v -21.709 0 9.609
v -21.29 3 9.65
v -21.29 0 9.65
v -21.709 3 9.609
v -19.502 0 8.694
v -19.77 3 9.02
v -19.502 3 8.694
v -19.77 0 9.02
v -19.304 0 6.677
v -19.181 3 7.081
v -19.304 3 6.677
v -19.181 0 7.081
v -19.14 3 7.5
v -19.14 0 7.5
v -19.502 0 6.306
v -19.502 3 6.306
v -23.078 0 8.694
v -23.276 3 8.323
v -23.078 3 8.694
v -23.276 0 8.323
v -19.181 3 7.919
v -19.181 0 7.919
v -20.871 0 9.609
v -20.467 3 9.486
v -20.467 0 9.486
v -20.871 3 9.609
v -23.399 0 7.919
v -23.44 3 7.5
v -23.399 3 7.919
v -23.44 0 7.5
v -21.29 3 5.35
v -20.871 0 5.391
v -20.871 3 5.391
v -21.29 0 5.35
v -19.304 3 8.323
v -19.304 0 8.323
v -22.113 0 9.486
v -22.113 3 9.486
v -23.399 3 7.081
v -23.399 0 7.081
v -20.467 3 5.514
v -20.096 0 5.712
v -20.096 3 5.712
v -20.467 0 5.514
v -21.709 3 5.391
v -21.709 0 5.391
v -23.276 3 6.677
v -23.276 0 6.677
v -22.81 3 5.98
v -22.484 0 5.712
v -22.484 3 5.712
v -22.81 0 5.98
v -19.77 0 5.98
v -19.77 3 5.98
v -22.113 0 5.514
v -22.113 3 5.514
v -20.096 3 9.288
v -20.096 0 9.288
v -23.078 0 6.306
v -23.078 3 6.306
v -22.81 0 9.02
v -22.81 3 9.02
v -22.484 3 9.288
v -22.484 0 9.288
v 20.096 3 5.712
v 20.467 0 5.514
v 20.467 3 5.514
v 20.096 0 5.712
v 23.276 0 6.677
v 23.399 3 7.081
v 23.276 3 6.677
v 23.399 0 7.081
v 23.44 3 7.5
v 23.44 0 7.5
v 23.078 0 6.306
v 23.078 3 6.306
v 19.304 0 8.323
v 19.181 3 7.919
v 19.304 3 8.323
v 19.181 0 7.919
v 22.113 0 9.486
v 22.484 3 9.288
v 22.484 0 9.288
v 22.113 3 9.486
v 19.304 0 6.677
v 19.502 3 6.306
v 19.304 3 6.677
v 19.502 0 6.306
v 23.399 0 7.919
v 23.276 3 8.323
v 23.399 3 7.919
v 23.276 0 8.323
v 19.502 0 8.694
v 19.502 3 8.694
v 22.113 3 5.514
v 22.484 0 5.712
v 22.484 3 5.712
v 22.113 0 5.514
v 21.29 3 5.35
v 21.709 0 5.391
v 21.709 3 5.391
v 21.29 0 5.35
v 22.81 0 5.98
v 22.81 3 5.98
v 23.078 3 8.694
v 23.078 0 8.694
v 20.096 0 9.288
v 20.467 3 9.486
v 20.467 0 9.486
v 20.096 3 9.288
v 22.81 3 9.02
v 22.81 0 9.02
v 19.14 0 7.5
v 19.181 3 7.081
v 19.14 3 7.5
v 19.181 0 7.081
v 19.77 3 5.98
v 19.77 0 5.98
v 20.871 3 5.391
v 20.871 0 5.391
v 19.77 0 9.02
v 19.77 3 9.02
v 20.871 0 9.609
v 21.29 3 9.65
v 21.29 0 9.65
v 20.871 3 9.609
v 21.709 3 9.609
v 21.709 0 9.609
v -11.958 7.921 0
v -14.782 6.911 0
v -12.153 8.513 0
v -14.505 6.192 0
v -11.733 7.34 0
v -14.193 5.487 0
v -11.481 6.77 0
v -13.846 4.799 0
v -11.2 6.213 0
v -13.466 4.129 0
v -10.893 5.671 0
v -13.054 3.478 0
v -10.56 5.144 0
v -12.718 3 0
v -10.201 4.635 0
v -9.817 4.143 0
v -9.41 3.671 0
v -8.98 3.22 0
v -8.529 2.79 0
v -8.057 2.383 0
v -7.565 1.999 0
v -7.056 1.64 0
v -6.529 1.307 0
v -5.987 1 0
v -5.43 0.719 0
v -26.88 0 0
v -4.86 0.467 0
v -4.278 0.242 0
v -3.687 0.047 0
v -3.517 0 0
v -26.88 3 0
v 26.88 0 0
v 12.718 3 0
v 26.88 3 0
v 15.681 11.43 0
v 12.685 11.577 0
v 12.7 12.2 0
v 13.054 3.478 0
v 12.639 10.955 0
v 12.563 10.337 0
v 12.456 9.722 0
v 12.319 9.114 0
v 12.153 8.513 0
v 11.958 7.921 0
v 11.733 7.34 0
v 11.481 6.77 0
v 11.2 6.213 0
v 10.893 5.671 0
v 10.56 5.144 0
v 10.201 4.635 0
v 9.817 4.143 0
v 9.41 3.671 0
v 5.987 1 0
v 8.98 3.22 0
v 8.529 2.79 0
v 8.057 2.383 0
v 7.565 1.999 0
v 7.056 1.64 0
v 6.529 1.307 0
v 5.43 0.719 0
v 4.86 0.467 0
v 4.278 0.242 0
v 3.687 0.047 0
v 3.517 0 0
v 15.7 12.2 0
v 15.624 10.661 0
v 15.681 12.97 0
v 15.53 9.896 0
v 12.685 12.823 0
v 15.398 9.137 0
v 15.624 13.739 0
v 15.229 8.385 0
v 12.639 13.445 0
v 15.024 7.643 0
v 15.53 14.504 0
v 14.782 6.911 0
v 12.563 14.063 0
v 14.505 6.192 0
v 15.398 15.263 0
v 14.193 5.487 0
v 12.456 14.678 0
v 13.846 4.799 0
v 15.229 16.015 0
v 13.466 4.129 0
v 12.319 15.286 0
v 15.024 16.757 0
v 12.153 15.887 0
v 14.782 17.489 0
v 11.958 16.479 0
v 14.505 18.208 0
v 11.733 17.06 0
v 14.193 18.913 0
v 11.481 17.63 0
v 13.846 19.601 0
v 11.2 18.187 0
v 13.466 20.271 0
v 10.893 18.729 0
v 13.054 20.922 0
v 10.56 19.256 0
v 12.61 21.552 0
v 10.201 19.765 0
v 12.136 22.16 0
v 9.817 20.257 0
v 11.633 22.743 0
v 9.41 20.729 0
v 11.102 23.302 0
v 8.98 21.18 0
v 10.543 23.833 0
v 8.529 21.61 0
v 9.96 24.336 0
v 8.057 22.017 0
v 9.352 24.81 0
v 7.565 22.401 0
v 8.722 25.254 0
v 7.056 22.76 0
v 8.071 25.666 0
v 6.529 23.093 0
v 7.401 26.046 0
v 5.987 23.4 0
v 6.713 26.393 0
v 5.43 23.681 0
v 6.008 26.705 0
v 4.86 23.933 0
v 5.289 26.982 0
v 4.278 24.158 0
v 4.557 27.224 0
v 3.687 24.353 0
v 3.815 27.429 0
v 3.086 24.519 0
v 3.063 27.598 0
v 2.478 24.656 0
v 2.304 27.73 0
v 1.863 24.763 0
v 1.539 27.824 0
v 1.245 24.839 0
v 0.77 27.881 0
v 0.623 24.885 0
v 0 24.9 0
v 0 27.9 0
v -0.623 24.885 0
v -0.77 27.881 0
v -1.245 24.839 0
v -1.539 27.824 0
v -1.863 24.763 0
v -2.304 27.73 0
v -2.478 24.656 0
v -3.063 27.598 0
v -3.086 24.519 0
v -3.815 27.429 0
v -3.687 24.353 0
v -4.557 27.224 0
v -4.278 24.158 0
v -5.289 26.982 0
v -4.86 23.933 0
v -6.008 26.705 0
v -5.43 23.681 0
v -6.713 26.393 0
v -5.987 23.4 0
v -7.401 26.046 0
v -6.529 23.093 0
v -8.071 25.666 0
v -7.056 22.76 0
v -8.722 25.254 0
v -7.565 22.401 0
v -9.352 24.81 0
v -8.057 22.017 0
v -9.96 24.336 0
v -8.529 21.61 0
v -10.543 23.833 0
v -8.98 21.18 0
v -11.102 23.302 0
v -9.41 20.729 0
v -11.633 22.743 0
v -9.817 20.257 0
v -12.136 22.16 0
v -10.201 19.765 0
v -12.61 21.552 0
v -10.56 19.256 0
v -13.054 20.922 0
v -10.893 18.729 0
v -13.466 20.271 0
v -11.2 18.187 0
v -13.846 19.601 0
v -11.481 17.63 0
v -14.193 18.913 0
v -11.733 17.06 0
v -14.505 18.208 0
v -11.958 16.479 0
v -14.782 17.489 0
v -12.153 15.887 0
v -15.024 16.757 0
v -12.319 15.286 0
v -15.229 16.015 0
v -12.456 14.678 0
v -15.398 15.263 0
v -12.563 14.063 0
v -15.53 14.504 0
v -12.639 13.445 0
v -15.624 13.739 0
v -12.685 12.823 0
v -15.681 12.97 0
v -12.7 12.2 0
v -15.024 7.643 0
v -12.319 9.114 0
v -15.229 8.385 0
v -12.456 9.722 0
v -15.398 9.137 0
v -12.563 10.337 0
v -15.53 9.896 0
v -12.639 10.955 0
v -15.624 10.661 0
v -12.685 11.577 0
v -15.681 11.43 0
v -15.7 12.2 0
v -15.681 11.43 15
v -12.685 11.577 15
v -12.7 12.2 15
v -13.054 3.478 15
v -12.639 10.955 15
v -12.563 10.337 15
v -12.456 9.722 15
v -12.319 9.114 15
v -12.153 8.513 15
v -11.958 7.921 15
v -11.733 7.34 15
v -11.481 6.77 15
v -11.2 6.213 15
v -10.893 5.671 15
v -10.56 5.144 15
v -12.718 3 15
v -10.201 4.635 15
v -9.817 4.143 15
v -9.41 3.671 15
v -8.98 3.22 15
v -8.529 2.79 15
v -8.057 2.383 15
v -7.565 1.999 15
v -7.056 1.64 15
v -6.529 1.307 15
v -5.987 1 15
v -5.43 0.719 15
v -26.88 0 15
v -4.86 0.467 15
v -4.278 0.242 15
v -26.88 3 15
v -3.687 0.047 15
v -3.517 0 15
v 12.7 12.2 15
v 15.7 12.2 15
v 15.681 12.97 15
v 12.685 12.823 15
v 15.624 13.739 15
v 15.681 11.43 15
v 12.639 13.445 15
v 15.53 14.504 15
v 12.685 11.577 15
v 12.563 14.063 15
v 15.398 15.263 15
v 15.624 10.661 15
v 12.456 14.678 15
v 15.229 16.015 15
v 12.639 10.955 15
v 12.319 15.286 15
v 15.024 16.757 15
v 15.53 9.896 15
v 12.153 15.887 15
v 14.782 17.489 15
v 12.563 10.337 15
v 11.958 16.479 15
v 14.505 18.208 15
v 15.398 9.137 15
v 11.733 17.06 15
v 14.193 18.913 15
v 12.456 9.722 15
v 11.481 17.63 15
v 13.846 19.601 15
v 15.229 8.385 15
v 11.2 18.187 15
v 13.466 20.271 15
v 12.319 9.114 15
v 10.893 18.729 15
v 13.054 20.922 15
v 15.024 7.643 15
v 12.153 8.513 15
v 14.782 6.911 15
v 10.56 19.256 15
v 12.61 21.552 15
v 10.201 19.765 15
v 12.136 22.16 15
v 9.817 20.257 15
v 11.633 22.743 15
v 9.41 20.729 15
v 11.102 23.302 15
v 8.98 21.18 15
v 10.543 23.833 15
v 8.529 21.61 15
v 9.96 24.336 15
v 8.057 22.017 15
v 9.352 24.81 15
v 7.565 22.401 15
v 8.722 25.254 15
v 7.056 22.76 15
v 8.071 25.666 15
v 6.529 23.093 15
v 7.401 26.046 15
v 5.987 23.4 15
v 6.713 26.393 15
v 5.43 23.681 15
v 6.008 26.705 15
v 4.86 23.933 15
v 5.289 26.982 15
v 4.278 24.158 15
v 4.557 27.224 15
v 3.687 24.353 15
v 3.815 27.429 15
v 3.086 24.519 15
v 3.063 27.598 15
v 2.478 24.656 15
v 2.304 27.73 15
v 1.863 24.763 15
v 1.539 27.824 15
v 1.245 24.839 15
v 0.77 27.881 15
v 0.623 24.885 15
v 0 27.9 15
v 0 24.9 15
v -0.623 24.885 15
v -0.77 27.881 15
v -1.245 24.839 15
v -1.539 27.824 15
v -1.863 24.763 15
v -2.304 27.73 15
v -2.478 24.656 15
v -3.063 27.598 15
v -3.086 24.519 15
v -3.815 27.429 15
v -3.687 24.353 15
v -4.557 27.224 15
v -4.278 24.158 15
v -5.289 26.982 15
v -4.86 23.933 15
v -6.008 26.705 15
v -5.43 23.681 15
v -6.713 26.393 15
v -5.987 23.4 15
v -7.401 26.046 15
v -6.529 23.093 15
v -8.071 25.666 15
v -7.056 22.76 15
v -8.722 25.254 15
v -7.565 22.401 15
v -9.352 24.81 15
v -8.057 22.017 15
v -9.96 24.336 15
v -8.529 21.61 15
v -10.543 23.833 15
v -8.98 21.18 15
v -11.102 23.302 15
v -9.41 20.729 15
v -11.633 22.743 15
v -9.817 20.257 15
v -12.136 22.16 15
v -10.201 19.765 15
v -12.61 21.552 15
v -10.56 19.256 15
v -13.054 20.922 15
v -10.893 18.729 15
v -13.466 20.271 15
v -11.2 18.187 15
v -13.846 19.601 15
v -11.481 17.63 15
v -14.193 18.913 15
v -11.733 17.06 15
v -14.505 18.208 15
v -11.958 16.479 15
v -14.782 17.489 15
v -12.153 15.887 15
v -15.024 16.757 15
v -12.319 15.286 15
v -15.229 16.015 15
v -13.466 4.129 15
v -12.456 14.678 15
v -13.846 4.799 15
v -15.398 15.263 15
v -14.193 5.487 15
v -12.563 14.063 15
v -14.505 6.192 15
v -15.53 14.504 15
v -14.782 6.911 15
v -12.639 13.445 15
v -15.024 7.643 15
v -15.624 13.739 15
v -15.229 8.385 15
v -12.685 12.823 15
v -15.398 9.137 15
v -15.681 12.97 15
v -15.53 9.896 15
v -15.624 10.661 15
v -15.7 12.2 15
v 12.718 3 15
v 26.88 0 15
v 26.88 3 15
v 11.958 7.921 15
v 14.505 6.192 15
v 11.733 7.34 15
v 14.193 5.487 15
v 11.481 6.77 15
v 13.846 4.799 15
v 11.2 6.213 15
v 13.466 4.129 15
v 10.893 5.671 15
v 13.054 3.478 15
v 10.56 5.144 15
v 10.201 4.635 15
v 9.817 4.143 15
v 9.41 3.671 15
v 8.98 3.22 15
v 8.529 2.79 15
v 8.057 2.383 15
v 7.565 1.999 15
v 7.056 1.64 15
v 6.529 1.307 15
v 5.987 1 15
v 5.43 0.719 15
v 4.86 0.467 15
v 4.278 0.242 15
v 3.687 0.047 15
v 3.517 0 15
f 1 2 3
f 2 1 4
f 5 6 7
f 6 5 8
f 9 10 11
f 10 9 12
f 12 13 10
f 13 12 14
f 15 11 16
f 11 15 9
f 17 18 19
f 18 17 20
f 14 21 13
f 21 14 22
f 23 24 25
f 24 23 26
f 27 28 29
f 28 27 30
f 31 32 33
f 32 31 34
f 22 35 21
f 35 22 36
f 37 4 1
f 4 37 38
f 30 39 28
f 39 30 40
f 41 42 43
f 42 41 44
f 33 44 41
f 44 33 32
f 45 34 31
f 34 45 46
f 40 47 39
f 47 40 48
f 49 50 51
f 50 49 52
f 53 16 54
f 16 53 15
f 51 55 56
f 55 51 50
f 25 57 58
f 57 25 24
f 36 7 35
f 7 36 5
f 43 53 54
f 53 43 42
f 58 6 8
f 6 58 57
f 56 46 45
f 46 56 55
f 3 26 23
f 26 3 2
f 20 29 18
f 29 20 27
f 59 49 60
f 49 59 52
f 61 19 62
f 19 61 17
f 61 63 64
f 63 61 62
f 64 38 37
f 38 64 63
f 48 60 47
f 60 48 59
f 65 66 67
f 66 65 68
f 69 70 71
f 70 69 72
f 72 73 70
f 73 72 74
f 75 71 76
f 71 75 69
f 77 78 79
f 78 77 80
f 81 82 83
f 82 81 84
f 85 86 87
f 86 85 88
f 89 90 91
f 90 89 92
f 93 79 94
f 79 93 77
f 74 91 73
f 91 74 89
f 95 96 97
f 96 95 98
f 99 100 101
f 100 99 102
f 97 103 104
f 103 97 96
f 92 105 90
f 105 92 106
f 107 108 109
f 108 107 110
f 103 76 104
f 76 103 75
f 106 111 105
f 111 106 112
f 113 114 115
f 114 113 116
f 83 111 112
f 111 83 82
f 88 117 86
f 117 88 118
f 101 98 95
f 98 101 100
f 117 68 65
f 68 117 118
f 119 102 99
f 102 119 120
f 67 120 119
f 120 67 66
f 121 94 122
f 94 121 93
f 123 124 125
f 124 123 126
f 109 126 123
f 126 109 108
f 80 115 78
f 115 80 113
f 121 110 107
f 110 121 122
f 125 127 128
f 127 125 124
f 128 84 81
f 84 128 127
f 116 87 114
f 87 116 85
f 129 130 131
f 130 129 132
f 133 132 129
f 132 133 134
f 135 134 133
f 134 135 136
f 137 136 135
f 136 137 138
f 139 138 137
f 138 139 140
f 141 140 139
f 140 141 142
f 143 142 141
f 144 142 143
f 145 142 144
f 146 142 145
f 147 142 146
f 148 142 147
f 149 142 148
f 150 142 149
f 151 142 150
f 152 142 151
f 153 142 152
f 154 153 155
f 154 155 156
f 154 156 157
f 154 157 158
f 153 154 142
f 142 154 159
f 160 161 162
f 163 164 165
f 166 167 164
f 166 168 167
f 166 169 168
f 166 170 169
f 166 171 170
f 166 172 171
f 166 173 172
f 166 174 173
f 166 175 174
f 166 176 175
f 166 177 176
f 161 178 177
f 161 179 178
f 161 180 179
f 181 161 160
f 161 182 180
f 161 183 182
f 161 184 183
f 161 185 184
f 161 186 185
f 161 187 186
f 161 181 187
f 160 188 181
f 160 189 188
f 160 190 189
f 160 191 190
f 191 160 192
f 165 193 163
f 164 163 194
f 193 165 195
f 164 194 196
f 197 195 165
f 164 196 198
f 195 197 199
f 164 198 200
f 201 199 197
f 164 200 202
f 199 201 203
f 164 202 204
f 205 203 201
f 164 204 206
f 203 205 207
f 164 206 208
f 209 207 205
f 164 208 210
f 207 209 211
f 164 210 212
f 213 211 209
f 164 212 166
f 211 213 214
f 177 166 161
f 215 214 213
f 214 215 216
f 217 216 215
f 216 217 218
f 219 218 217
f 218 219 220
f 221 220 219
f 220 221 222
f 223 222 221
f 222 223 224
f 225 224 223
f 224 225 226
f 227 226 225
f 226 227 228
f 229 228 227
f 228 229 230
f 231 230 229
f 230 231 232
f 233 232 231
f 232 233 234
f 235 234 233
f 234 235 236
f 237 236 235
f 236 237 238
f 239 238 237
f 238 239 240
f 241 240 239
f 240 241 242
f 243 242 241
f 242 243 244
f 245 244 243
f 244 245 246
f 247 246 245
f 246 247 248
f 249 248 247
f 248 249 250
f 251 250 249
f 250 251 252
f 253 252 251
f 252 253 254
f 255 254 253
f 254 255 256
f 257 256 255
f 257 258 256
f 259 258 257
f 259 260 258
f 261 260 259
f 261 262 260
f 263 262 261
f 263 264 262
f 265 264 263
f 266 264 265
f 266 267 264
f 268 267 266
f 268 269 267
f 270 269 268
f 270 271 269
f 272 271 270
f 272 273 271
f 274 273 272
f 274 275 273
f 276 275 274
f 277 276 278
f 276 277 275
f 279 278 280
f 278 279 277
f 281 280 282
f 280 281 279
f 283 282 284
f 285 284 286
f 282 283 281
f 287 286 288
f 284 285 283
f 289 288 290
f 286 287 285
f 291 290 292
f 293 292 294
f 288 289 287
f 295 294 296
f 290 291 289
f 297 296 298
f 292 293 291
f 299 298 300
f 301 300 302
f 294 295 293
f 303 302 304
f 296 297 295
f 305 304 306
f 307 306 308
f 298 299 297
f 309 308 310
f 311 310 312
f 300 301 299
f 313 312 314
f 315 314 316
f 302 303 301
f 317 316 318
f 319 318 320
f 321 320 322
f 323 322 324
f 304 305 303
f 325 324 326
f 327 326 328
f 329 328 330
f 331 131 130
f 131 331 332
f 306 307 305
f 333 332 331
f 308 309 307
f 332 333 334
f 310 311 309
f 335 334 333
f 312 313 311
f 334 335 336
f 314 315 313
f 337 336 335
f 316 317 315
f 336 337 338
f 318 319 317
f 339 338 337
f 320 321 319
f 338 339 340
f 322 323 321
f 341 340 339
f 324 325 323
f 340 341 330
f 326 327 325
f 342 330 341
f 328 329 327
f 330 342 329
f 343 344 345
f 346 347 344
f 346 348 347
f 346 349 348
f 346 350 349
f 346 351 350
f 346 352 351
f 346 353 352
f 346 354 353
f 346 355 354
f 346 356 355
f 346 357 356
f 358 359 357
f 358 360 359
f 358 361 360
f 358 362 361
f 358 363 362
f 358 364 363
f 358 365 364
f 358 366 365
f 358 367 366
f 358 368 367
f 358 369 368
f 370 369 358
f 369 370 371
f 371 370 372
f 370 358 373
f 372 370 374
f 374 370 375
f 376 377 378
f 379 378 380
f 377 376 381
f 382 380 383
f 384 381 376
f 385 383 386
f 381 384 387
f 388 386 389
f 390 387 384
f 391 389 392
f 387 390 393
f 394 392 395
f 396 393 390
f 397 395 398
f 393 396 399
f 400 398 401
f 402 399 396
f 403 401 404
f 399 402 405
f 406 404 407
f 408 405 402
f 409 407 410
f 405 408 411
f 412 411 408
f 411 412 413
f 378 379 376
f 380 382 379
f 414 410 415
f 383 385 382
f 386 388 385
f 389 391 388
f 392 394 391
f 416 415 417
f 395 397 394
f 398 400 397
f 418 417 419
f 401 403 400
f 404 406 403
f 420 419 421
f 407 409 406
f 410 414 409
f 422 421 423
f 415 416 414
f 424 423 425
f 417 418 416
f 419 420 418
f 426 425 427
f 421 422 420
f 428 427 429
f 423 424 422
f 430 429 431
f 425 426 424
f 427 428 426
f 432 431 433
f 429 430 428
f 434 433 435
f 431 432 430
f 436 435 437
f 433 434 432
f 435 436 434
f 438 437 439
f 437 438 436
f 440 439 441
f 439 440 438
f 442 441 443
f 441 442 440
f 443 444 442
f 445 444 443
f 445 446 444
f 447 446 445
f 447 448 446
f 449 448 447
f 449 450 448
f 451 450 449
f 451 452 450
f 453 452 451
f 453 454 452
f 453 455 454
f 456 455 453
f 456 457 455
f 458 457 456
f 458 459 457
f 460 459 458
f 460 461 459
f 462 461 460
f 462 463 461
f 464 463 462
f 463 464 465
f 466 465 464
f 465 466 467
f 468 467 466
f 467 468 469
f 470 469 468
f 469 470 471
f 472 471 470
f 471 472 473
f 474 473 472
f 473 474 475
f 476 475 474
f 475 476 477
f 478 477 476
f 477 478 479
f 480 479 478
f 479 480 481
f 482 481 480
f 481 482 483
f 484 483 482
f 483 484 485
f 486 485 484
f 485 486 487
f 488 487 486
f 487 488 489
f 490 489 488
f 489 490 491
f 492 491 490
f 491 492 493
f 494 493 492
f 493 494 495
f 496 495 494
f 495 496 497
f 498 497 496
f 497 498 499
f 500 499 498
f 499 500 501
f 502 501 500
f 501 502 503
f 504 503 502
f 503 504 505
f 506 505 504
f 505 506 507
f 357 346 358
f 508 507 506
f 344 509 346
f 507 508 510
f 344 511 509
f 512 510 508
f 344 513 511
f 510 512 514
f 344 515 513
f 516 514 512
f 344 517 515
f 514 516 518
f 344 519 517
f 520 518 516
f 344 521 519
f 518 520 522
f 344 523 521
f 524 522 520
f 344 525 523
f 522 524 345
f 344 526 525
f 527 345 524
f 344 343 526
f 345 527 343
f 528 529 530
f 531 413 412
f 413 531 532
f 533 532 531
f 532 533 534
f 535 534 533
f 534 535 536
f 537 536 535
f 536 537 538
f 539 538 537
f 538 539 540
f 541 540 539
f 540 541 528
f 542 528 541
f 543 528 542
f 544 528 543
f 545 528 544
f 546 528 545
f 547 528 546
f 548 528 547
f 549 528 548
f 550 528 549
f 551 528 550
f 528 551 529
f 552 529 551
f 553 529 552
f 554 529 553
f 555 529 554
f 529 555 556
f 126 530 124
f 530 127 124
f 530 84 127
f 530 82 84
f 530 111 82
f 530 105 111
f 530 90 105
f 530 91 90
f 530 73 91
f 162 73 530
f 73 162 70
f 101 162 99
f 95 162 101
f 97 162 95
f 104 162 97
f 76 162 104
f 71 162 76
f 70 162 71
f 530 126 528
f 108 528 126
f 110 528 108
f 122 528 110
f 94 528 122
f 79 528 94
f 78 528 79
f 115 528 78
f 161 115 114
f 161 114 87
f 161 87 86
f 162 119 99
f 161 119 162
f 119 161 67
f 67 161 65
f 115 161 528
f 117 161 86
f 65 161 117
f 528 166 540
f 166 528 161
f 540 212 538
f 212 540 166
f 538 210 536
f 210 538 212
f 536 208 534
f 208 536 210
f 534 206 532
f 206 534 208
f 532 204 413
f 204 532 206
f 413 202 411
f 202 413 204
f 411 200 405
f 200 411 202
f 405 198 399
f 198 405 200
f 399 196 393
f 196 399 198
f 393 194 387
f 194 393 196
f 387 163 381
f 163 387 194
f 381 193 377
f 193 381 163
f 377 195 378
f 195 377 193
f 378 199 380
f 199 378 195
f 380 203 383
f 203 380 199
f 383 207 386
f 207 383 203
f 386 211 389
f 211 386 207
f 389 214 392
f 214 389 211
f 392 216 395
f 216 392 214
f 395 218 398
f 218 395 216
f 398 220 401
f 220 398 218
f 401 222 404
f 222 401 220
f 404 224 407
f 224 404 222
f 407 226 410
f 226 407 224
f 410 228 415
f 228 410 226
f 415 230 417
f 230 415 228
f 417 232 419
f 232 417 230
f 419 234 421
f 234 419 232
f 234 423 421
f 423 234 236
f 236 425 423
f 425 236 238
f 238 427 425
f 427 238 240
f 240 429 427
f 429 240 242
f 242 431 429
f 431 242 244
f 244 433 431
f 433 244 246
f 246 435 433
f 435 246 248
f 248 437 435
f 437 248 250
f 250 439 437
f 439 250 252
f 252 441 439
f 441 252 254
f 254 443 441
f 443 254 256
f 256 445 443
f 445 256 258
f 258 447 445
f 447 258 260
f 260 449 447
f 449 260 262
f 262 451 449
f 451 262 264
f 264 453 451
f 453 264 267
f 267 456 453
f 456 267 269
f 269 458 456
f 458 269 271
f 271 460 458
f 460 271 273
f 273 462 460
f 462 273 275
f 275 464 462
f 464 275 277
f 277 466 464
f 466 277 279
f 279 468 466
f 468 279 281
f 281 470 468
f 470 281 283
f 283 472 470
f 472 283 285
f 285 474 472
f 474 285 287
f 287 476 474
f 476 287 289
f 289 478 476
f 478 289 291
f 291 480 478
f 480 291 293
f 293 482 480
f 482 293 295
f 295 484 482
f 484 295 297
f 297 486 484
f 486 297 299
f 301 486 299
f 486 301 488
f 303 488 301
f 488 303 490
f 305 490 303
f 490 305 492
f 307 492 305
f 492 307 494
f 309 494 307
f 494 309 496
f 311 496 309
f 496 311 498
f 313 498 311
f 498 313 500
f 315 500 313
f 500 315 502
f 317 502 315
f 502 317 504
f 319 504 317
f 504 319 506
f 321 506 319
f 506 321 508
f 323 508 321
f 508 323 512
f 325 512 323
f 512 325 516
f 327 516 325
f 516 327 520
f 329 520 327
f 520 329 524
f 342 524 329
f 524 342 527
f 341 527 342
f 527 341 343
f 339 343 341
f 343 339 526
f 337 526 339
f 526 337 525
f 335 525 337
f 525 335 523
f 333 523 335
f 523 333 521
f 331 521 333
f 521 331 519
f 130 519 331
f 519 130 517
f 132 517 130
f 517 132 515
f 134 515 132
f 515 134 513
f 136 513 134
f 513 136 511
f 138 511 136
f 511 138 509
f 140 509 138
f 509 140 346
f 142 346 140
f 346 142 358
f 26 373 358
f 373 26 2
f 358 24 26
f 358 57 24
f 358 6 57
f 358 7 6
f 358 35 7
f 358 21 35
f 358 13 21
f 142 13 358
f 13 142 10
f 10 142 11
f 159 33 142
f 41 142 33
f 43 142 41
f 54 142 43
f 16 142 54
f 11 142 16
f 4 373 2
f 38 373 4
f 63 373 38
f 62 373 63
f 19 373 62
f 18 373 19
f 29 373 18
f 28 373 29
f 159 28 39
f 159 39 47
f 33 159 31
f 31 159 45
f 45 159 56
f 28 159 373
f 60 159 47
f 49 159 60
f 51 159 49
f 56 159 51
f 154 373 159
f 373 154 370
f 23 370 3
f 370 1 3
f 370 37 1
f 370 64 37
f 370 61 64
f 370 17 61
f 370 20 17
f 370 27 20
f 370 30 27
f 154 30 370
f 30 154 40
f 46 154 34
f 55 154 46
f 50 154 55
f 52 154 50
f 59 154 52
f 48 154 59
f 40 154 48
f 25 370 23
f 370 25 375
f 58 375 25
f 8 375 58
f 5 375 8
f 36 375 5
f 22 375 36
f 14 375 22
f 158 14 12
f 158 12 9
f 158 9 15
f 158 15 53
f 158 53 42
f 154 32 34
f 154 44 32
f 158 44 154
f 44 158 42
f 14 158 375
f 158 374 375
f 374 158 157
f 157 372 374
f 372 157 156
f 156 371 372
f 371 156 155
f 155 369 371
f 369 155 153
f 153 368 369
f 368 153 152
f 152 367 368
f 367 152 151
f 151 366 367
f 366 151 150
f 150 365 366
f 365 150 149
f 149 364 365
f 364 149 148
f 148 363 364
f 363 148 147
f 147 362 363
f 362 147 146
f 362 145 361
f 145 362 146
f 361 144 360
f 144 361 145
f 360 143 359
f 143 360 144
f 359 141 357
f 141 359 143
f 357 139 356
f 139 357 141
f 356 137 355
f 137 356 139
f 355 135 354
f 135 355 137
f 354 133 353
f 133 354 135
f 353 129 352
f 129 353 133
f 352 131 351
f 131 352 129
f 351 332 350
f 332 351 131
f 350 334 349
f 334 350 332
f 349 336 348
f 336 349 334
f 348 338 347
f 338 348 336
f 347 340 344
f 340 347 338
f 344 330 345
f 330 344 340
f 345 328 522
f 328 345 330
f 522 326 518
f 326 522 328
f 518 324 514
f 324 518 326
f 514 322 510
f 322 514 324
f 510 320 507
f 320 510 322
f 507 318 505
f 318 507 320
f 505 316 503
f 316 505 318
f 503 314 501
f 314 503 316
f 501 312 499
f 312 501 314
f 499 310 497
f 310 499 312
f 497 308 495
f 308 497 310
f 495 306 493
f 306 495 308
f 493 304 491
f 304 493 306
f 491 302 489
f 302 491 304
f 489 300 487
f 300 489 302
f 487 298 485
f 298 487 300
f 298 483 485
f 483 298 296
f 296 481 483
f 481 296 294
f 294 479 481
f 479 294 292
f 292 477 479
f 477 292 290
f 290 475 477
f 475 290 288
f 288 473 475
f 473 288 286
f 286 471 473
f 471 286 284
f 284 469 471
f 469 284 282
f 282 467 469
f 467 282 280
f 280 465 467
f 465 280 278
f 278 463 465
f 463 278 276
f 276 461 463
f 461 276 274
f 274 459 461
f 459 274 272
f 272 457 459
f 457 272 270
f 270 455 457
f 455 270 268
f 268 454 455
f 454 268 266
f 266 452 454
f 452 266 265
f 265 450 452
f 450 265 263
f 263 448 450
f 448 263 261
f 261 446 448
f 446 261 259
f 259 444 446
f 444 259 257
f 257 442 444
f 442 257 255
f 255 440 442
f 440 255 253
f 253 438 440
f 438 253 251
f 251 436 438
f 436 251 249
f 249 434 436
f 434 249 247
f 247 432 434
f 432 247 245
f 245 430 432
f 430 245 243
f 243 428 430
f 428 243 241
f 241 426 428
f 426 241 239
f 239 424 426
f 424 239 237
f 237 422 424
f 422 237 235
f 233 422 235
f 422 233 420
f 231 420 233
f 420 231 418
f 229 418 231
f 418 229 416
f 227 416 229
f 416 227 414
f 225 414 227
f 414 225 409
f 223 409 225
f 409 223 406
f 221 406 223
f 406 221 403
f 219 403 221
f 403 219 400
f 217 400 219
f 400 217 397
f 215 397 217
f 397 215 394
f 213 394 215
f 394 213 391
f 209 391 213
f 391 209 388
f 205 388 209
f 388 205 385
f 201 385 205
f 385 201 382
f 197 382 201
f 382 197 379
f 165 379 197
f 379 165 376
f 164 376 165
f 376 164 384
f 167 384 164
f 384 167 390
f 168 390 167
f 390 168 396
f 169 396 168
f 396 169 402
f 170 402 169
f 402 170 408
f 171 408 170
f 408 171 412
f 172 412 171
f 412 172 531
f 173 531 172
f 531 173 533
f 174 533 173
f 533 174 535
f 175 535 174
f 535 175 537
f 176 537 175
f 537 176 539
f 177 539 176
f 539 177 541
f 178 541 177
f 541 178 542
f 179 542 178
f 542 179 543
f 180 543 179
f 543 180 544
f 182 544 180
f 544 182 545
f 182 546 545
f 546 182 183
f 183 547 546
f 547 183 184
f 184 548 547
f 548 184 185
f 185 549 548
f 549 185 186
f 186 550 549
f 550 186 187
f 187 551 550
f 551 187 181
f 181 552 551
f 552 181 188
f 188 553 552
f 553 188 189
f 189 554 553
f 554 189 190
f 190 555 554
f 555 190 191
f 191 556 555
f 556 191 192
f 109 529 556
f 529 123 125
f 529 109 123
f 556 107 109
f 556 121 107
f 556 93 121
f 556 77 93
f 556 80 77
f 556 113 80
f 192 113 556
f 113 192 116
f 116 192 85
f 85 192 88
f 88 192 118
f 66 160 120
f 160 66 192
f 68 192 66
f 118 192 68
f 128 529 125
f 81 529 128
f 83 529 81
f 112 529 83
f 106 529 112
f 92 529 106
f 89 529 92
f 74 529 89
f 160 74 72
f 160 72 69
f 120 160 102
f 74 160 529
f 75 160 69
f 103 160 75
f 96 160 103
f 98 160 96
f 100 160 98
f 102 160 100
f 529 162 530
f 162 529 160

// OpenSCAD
// Pipe clamp (wall saddle)
// Hope Arising EPICS team (ASU) - original design. License: CC BY 4.0 (commercial use allowed).
// Holds a pipe, hose or cable bundle against a wall with two screws.
// Prints lying on its side, no supports. Use the Strong setting for heavy pipes.

/* [Size] */
// Outside diameter of the pipe it holds
pipe_diameter = 25;       // [6:0.5:110]
// Width of the strap (how far along the pipe it reaches)
strap_width = 15;         // [6:1:40]
// Thickness of the strap. Thicker is stronger.
strap_thickness = 3;      // [2:0.5:8]
// Diameter of the wall screws
screw_diameter = 4;       // [2.5:0.5:6]

/* [Hidden] */
$fn = 128;
fit_clearance = 0.4;      // so the pipe slides in

module pipe_clamp() {
    r  = (pipe_diameter + fit_clearance) / 2;
    t  = strap_thickness;
    hole_d = screw_diameter + 0.3;
    ear = max(hole_d * 2.6, 8);                 // flange length past the strap
    ear_x = r + t + ear / 2;                    // screw hole position
    cy = r - 0.5;                               // pipe pressed 0.5 mm into the wall line = grip
    difference() {
        linear_extrude(height = strap_width)
            difference() {
                union() {
                    // U strap over the pipe, cut off at the wall (y = 0)
                    intersection() {
                        translate([0, cy]) circle(r = r + t);
                        translate([-(r + t + 1), 0]) square([2 * (r + t + 1), 2 * (r + t) + 1]);
                    }
                    // flat flange against the wall
                    translate([-(r + t + ear), 0]) square([2 * (r + t + ear), t]);
                }
                translate([0, cy]) circle(r = r);
            }
        // screw holes through the flange, into the wall
        for (sx = [-1, 1])
            translate([sx * ear_x, -1, strap_width / 2])
                rotate([-90, 0, 0]) cylinder(h = t + 2, d = hole_d, $fn = 32);
    }
}

pipe_clamp();
